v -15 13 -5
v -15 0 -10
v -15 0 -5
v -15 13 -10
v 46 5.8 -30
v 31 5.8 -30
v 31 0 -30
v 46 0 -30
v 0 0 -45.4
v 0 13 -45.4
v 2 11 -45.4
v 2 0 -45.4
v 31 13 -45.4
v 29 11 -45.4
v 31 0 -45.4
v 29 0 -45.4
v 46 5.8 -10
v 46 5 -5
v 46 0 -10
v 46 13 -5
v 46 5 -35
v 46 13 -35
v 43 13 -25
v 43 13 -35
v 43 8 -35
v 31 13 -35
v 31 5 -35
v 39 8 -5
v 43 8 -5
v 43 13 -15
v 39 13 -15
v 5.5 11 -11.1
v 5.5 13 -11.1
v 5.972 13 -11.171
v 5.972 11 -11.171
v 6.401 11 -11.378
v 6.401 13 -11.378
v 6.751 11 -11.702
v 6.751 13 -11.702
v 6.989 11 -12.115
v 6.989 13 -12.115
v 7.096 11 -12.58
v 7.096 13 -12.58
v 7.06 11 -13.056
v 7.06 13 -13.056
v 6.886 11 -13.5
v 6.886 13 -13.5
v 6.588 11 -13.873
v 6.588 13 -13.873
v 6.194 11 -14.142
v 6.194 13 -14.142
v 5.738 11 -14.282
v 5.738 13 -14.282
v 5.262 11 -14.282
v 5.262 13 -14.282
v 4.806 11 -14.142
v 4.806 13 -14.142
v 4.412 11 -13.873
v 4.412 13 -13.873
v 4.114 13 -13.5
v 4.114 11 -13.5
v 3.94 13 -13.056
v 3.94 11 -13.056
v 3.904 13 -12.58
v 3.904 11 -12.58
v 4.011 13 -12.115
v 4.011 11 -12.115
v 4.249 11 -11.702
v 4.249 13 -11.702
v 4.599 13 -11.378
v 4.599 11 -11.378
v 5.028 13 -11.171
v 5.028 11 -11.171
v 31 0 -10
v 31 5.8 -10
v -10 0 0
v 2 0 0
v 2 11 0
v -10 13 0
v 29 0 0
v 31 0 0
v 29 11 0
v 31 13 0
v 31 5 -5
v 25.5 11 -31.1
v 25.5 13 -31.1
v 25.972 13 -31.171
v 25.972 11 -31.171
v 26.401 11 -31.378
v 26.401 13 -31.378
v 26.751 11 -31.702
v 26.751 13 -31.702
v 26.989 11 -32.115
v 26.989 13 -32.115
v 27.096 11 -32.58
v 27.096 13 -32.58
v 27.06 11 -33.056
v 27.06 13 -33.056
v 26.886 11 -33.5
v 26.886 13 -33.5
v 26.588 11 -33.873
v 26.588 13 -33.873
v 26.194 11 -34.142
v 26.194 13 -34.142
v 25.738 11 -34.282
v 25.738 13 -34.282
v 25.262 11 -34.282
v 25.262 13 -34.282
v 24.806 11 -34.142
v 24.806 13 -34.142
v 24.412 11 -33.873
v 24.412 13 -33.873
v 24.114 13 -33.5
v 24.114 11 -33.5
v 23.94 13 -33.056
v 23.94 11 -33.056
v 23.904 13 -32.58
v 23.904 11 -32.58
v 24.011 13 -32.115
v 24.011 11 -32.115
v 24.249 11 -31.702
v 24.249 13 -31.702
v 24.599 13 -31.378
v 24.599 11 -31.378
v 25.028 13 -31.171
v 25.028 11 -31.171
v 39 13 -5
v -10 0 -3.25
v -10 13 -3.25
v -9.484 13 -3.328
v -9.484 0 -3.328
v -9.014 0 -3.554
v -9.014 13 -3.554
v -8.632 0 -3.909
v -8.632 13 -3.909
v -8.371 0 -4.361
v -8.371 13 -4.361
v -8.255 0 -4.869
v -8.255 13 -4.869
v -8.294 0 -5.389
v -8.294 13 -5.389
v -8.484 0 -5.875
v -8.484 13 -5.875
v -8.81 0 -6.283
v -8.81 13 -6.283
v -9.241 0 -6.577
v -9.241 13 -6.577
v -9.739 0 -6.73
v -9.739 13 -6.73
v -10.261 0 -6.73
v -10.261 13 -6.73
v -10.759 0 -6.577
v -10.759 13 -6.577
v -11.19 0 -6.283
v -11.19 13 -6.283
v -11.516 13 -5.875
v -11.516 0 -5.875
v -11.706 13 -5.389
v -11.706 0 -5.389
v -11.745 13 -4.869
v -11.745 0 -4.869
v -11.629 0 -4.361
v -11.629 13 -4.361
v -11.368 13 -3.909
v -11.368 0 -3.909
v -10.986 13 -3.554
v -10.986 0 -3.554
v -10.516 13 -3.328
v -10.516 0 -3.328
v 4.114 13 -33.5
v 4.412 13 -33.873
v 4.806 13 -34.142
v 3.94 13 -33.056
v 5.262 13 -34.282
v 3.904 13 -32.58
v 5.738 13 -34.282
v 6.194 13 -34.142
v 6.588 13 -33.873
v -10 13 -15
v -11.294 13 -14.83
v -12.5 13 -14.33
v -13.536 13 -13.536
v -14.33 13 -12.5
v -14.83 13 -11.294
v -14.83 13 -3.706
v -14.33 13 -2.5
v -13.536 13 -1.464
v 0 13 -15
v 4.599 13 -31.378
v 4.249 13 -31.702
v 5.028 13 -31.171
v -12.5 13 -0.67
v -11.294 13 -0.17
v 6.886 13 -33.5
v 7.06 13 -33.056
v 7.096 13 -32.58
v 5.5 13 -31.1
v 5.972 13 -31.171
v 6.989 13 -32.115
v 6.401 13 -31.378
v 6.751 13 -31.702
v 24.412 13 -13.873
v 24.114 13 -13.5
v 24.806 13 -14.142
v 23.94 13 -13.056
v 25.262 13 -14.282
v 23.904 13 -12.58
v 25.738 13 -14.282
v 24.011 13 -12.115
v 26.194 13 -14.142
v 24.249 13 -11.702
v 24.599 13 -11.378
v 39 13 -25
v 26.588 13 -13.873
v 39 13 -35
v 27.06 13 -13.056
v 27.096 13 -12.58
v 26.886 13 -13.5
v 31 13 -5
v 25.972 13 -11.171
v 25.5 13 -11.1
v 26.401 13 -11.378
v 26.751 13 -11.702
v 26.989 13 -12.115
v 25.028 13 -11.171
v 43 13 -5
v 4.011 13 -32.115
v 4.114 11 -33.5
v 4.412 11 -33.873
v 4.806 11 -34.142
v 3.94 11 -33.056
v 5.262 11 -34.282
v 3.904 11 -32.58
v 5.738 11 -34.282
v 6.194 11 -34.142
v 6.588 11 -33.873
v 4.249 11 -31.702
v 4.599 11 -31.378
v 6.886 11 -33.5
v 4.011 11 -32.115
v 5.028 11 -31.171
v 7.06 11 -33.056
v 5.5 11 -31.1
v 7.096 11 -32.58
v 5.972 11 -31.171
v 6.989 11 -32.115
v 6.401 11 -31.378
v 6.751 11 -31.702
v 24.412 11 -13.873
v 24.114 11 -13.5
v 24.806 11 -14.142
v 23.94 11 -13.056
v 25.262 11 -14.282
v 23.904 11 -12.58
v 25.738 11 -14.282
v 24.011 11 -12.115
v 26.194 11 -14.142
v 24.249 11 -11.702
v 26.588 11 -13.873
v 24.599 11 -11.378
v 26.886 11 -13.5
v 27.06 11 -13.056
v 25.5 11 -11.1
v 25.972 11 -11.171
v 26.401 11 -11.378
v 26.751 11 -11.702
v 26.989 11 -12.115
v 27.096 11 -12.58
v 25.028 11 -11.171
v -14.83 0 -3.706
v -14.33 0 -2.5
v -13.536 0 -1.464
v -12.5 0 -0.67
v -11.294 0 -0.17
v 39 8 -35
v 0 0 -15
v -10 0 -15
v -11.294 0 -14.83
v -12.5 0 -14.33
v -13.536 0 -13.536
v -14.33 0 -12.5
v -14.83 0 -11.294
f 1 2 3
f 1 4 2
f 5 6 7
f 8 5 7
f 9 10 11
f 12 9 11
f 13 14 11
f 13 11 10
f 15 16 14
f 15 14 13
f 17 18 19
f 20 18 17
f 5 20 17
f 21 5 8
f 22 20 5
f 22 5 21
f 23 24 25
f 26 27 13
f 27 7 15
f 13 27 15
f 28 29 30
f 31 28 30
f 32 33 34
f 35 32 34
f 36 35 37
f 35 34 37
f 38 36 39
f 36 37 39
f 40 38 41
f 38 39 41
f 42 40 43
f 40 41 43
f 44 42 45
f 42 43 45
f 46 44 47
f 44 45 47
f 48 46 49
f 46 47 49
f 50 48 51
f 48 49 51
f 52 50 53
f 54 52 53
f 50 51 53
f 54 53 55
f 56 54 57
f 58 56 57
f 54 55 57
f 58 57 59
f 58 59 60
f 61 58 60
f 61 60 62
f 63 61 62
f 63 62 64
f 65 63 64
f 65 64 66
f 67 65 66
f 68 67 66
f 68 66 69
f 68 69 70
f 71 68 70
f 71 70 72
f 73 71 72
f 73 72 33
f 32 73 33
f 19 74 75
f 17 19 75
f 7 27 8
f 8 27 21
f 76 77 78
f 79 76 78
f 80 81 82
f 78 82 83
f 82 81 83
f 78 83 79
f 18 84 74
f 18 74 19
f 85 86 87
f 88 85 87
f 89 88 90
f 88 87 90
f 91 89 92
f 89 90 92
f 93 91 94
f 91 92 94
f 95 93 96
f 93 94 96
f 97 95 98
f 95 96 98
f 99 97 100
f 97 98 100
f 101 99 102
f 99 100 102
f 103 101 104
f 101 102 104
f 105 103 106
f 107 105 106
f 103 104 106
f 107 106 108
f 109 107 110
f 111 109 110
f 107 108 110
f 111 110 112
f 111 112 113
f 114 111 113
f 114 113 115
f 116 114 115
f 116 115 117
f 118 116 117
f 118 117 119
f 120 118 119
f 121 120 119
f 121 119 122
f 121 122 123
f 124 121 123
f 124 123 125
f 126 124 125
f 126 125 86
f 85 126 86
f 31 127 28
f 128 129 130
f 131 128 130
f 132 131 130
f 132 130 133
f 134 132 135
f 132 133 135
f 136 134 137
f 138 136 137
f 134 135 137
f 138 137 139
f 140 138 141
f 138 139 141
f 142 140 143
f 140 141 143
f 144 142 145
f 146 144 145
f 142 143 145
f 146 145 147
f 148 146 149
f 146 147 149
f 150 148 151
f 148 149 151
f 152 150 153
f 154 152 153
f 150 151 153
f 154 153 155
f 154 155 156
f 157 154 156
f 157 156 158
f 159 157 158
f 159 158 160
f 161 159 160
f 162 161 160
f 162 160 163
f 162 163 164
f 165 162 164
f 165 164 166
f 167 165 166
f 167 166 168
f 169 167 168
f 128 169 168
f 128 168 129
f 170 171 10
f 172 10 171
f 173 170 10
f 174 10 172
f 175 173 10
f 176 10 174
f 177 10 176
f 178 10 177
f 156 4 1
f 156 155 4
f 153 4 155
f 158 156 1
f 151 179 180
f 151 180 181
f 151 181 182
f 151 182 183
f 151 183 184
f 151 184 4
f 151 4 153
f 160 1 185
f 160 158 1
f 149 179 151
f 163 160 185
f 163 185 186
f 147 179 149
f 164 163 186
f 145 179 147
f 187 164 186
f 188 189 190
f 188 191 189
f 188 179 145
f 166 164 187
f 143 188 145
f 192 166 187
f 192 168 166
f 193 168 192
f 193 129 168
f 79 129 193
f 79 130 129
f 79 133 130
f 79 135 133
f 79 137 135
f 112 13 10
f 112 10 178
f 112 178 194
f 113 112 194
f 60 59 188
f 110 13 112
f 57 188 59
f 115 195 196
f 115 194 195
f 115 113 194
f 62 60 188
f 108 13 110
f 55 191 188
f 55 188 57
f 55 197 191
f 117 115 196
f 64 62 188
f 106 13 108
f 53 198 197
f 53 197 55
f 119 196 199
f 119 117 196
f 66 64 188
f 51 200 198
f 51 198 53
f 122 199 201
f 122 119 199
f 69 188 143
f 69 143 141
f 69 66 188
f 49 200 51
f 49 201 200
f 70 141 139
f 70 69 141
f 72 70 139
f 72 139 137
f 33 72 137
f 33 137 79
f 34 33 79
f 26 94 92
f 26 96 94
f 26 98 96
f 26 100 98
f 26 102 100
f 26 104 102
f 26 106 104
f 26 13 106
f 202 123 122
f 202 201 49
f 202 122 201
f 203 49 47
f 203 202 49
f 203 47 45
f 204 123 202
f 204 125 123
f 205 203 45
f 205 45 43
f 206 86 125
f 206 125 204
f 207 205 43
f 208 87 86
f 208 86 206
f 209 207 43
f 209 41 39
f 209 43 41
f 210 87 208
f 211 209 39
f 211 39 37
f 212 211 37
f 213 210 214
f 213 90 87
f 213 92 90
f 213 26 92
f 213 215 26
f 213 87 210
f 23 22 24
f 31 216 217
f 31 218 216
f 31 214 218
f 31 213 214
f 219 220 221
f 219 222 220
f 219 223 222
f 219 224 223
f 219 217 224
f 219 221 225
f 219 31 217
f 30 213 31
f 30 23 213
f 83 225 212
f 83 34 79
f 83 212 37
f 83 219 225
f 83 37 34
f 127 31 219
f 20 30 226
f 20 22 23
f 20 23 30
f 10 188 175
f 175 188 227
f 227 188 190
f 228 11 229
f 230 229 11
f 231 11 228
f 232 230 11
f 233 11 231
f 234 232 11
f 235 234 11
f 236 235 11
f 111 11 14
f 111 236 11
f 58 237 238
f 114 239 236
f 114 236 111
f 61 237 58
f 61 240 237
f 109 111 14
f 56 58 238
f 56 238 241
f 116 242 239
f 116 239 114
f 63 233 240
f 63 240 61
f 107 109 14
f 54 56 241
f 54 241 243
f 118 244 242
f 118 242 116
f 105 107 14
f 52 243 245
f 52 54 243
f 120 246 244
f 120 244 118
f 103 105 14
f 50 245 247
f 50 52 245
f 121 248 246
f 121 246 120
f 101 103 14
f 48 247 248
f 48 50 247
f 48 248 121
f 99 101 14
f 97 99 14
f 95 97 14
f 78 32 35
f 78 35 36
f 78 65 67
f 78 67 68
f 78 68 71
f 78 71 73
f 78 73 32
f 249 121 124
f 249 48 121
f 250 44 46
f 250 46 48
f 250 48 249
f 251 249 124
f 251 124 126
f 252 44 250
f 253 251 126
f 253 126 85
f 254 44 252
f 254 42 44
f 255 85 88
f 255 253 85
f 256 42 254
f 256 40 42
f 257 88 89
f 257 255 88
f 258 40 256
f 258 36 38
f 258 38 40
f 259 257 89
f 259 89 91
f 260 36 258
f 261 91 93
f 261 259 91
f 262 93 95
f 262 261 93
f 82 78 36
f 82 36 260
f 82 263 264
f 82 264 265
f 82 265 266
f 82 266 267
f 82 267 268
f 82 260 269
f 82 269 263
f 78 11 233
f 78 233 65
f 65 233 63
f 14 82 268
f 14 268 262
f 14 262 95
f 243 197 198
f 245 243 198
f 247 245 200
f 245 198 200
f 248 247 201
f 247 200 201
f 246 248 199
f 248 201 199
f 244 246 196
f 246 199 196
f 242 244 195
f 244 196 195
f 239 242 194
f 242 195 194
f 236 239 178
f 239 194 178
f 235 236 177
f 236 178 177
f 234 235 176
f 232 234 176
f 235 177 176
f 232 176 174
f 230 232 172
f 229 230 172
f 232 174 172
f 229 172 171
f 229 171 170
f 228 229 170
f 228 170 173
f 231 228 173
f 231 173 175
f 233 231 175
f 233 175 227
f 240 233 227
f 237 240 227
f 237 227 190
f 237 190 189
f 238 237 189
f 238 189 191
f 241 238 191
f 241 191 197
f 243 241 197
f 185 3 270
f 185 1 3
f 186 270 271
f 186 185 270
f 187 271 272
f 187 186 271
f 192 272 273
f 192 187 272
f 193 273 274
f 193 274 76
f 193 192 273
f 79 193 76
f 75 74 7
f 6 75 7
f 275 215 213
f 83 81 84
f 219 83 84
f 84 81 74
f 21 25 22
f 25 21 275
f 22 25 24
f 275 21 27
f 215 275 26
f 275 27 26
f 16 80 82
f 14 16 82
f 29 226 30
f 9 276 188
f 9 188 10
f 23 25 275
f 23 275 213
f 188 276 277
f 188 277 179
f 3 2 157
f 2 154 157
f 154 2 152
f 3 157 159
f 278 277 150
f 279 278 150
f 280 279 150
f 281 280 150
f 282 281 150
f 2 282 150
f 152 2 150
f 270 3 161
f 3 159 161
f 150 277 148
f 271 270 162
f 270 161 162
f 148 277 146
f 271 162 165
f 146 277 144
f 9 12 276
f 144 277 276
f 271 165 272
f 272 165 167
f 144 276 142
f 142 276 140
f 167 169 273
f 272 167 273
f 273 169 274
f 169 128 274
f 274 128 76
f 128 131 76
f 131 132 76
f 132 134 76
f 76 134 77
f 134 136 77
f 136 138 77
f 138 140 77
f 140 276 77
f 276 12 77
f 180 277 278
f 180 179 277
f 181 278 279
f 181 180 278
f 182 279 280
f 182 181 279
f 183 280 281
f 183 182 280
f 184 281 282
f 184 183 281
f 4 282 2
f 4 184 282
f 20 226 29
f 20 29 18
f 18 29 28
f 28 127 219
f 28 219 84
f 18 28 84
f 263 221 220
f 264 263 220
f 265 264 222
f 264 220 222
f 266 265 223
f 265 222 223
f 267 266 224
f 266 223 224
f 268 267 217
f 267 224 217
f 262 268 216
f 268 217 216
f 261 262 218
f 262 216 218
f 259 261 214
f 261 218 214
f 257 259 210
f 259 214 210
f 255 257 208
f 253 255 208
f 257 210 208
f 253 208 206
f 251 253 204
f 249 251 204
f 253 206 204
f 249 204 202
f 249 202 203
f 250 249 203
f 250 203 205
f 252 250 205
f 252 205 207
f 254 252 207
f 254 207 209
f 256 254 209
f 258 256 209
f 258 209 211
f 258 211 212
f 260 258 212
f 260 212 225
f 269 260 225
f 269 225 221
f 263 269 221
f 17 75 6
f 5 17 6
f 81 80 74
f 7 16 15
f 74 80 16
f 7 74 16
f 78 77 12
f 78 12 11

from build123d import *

# Parameters (mm, degrees)
SKETCH1_W           = 31
SKETCH1_H           = 45.4
BOSS_EXTRUDE1_DEPTH = 13
SKETCH2_W           = 27
SKETCH2_H           = 11
CUT_EXTRUDE1_DEPTH  = 57.490353159
SKETCH3_R           = 1.6
CUT_EXTRUDE2_DEPTH  = 10
SKETCH4_W           = 15
SKETCH4_H           = 13
BOSS_EXTRUDE2_DEPTH = 15
SKETCH5_R           = 1.75
CUT_EXTRUDE3_DEPTH  = 20
FILLET1_R           = 5
BOSS_EXTRUDE3_DEPTH = 15
CHAMFER1_SIZE       = 5
CUT_EXTRUDE4_DEPTH  = 4


with BuildPart() as part:
    # Sketch1 → Boss-Extrude1 (new body)
    with BuildSketch(Plane(origin=(0, 0, 0), x_dir=(1, 0, 0), z_dir=(0, 1, 0))):
        with Locations((15.5, 22.7)):
            Rectangle(SKETCH1_W, SKETCH1_H)
    extrude(amount=BOSS_EXTRUDE1_DEPTH)

    # Sketch2 → Cut-Extrude1 (cut, through all)
    with BuildSketch(Plane.XY):
        with Locations((15.5, 5.5)):
            Rectangle(SKETCH2_W, SKETCH2_H)
    extrude(amount=-CUT_EXTRUDE1_DEPTH, mode=Mode.SUBTRACT)

    # Sketch3 → Cut-Extrude2 (cut)
    with BuildSketch(Plane(origin=(0, 13, 0), x_dir=(1, 0, 0), z_dir=(0, 1, 0))):
        with Locations(Location((5.5, 32.7, 0), (0, 0, 270))):
            Circle(SKETCH3_R)
        with Locations(Location((25.5, 32.7, 0), (0, 0, 270))):
            Circle(SKETCH3_R)
        with Locations(Location((25.5, 12.7, 0), (0, 0, 270))):
            Circle(SKETCH3_R)
        with Locations(Location((5.5, 12.7, 0), (0, 0, 270))):
            Circle(SKETCH3_R)
    extrude(amount=-CUT_EXTRUDE2_DEPTH, mode=Mode.SUBTRACT)

    # Sketch4 → Boss-Extrude2 (add)
    with BuildSketch(Plane.ZY):
        with Locations((-7.5, 6.5)):
            Rectangle(SKETCH4_W, SKETCH4_H)
    extrude(amount=BOSS_EXTRUDE2_DEPTH)

    # Sketch5 → Cut-Extrude3 (cut)
    with BuildSketch(Plane(origin=(0, 13, 0), x_dir=(1, 0, 0), z_dir=(0, 1, 0))):
        with Locations(Location((-10, 5, 0), (0, 0, 270))):
            Circle(SKETCH5_R)
    extrude(amount=-CUT_EXTRUDE3_DEPTH, mode=Mode.SUBTRACT)

    # Fillet1
    fillet1_edges = [part.edges().sort_by_distance(p)[0] for p in [
        (-15, 6.5, -15),
        (-15, 6.5, 0),
    ]]
    fillet(fillet1_edges, radius=FILLET1_R)

    # Sketch6 → Boss-Extrude3 (add)
    with BuildSketch(Plane(origin=(31, 0, 0), x_dir=(0, 0, -1), z_dir=(1, 0, 0))):
        Polygon((5, 0), (10, 0), (10, 5.8), (30, 5.8), (30, 0), (35, 0), (35, 13), (5, 13), align=None)
    extrude(amount=BOSS_EXTRUDE3_DEPTH)

    # Chamfer1
    chamfer1_edges = [part.edges().sort_by_distance(p)[0] for p in [
        (38.5, 0, -5),
        (38.5, 0, -35),
    ]]
    chamfer(chamfer1_edges, length=CHAMFER1_SIZE - 0.0001)  # a hair under: the kernel refuses the full size

    # Sketch7 → Cut-Extrude4 (cut)
    with BuildSketch(Plane(origin=(43, 0, 0), x_dir=(0, 0, -1), z_dir=(1, 0, 0))):
        Polygon((5, 8), (15, 13), (5, 13), align=None)
        Polygon((35, 8), (25, 13), (35, 13), align=None)
    extrude(amount=-CUT_EXTRUDE4_DEPTH, mode=Mode.SUBTRACT)


solid = part.part
